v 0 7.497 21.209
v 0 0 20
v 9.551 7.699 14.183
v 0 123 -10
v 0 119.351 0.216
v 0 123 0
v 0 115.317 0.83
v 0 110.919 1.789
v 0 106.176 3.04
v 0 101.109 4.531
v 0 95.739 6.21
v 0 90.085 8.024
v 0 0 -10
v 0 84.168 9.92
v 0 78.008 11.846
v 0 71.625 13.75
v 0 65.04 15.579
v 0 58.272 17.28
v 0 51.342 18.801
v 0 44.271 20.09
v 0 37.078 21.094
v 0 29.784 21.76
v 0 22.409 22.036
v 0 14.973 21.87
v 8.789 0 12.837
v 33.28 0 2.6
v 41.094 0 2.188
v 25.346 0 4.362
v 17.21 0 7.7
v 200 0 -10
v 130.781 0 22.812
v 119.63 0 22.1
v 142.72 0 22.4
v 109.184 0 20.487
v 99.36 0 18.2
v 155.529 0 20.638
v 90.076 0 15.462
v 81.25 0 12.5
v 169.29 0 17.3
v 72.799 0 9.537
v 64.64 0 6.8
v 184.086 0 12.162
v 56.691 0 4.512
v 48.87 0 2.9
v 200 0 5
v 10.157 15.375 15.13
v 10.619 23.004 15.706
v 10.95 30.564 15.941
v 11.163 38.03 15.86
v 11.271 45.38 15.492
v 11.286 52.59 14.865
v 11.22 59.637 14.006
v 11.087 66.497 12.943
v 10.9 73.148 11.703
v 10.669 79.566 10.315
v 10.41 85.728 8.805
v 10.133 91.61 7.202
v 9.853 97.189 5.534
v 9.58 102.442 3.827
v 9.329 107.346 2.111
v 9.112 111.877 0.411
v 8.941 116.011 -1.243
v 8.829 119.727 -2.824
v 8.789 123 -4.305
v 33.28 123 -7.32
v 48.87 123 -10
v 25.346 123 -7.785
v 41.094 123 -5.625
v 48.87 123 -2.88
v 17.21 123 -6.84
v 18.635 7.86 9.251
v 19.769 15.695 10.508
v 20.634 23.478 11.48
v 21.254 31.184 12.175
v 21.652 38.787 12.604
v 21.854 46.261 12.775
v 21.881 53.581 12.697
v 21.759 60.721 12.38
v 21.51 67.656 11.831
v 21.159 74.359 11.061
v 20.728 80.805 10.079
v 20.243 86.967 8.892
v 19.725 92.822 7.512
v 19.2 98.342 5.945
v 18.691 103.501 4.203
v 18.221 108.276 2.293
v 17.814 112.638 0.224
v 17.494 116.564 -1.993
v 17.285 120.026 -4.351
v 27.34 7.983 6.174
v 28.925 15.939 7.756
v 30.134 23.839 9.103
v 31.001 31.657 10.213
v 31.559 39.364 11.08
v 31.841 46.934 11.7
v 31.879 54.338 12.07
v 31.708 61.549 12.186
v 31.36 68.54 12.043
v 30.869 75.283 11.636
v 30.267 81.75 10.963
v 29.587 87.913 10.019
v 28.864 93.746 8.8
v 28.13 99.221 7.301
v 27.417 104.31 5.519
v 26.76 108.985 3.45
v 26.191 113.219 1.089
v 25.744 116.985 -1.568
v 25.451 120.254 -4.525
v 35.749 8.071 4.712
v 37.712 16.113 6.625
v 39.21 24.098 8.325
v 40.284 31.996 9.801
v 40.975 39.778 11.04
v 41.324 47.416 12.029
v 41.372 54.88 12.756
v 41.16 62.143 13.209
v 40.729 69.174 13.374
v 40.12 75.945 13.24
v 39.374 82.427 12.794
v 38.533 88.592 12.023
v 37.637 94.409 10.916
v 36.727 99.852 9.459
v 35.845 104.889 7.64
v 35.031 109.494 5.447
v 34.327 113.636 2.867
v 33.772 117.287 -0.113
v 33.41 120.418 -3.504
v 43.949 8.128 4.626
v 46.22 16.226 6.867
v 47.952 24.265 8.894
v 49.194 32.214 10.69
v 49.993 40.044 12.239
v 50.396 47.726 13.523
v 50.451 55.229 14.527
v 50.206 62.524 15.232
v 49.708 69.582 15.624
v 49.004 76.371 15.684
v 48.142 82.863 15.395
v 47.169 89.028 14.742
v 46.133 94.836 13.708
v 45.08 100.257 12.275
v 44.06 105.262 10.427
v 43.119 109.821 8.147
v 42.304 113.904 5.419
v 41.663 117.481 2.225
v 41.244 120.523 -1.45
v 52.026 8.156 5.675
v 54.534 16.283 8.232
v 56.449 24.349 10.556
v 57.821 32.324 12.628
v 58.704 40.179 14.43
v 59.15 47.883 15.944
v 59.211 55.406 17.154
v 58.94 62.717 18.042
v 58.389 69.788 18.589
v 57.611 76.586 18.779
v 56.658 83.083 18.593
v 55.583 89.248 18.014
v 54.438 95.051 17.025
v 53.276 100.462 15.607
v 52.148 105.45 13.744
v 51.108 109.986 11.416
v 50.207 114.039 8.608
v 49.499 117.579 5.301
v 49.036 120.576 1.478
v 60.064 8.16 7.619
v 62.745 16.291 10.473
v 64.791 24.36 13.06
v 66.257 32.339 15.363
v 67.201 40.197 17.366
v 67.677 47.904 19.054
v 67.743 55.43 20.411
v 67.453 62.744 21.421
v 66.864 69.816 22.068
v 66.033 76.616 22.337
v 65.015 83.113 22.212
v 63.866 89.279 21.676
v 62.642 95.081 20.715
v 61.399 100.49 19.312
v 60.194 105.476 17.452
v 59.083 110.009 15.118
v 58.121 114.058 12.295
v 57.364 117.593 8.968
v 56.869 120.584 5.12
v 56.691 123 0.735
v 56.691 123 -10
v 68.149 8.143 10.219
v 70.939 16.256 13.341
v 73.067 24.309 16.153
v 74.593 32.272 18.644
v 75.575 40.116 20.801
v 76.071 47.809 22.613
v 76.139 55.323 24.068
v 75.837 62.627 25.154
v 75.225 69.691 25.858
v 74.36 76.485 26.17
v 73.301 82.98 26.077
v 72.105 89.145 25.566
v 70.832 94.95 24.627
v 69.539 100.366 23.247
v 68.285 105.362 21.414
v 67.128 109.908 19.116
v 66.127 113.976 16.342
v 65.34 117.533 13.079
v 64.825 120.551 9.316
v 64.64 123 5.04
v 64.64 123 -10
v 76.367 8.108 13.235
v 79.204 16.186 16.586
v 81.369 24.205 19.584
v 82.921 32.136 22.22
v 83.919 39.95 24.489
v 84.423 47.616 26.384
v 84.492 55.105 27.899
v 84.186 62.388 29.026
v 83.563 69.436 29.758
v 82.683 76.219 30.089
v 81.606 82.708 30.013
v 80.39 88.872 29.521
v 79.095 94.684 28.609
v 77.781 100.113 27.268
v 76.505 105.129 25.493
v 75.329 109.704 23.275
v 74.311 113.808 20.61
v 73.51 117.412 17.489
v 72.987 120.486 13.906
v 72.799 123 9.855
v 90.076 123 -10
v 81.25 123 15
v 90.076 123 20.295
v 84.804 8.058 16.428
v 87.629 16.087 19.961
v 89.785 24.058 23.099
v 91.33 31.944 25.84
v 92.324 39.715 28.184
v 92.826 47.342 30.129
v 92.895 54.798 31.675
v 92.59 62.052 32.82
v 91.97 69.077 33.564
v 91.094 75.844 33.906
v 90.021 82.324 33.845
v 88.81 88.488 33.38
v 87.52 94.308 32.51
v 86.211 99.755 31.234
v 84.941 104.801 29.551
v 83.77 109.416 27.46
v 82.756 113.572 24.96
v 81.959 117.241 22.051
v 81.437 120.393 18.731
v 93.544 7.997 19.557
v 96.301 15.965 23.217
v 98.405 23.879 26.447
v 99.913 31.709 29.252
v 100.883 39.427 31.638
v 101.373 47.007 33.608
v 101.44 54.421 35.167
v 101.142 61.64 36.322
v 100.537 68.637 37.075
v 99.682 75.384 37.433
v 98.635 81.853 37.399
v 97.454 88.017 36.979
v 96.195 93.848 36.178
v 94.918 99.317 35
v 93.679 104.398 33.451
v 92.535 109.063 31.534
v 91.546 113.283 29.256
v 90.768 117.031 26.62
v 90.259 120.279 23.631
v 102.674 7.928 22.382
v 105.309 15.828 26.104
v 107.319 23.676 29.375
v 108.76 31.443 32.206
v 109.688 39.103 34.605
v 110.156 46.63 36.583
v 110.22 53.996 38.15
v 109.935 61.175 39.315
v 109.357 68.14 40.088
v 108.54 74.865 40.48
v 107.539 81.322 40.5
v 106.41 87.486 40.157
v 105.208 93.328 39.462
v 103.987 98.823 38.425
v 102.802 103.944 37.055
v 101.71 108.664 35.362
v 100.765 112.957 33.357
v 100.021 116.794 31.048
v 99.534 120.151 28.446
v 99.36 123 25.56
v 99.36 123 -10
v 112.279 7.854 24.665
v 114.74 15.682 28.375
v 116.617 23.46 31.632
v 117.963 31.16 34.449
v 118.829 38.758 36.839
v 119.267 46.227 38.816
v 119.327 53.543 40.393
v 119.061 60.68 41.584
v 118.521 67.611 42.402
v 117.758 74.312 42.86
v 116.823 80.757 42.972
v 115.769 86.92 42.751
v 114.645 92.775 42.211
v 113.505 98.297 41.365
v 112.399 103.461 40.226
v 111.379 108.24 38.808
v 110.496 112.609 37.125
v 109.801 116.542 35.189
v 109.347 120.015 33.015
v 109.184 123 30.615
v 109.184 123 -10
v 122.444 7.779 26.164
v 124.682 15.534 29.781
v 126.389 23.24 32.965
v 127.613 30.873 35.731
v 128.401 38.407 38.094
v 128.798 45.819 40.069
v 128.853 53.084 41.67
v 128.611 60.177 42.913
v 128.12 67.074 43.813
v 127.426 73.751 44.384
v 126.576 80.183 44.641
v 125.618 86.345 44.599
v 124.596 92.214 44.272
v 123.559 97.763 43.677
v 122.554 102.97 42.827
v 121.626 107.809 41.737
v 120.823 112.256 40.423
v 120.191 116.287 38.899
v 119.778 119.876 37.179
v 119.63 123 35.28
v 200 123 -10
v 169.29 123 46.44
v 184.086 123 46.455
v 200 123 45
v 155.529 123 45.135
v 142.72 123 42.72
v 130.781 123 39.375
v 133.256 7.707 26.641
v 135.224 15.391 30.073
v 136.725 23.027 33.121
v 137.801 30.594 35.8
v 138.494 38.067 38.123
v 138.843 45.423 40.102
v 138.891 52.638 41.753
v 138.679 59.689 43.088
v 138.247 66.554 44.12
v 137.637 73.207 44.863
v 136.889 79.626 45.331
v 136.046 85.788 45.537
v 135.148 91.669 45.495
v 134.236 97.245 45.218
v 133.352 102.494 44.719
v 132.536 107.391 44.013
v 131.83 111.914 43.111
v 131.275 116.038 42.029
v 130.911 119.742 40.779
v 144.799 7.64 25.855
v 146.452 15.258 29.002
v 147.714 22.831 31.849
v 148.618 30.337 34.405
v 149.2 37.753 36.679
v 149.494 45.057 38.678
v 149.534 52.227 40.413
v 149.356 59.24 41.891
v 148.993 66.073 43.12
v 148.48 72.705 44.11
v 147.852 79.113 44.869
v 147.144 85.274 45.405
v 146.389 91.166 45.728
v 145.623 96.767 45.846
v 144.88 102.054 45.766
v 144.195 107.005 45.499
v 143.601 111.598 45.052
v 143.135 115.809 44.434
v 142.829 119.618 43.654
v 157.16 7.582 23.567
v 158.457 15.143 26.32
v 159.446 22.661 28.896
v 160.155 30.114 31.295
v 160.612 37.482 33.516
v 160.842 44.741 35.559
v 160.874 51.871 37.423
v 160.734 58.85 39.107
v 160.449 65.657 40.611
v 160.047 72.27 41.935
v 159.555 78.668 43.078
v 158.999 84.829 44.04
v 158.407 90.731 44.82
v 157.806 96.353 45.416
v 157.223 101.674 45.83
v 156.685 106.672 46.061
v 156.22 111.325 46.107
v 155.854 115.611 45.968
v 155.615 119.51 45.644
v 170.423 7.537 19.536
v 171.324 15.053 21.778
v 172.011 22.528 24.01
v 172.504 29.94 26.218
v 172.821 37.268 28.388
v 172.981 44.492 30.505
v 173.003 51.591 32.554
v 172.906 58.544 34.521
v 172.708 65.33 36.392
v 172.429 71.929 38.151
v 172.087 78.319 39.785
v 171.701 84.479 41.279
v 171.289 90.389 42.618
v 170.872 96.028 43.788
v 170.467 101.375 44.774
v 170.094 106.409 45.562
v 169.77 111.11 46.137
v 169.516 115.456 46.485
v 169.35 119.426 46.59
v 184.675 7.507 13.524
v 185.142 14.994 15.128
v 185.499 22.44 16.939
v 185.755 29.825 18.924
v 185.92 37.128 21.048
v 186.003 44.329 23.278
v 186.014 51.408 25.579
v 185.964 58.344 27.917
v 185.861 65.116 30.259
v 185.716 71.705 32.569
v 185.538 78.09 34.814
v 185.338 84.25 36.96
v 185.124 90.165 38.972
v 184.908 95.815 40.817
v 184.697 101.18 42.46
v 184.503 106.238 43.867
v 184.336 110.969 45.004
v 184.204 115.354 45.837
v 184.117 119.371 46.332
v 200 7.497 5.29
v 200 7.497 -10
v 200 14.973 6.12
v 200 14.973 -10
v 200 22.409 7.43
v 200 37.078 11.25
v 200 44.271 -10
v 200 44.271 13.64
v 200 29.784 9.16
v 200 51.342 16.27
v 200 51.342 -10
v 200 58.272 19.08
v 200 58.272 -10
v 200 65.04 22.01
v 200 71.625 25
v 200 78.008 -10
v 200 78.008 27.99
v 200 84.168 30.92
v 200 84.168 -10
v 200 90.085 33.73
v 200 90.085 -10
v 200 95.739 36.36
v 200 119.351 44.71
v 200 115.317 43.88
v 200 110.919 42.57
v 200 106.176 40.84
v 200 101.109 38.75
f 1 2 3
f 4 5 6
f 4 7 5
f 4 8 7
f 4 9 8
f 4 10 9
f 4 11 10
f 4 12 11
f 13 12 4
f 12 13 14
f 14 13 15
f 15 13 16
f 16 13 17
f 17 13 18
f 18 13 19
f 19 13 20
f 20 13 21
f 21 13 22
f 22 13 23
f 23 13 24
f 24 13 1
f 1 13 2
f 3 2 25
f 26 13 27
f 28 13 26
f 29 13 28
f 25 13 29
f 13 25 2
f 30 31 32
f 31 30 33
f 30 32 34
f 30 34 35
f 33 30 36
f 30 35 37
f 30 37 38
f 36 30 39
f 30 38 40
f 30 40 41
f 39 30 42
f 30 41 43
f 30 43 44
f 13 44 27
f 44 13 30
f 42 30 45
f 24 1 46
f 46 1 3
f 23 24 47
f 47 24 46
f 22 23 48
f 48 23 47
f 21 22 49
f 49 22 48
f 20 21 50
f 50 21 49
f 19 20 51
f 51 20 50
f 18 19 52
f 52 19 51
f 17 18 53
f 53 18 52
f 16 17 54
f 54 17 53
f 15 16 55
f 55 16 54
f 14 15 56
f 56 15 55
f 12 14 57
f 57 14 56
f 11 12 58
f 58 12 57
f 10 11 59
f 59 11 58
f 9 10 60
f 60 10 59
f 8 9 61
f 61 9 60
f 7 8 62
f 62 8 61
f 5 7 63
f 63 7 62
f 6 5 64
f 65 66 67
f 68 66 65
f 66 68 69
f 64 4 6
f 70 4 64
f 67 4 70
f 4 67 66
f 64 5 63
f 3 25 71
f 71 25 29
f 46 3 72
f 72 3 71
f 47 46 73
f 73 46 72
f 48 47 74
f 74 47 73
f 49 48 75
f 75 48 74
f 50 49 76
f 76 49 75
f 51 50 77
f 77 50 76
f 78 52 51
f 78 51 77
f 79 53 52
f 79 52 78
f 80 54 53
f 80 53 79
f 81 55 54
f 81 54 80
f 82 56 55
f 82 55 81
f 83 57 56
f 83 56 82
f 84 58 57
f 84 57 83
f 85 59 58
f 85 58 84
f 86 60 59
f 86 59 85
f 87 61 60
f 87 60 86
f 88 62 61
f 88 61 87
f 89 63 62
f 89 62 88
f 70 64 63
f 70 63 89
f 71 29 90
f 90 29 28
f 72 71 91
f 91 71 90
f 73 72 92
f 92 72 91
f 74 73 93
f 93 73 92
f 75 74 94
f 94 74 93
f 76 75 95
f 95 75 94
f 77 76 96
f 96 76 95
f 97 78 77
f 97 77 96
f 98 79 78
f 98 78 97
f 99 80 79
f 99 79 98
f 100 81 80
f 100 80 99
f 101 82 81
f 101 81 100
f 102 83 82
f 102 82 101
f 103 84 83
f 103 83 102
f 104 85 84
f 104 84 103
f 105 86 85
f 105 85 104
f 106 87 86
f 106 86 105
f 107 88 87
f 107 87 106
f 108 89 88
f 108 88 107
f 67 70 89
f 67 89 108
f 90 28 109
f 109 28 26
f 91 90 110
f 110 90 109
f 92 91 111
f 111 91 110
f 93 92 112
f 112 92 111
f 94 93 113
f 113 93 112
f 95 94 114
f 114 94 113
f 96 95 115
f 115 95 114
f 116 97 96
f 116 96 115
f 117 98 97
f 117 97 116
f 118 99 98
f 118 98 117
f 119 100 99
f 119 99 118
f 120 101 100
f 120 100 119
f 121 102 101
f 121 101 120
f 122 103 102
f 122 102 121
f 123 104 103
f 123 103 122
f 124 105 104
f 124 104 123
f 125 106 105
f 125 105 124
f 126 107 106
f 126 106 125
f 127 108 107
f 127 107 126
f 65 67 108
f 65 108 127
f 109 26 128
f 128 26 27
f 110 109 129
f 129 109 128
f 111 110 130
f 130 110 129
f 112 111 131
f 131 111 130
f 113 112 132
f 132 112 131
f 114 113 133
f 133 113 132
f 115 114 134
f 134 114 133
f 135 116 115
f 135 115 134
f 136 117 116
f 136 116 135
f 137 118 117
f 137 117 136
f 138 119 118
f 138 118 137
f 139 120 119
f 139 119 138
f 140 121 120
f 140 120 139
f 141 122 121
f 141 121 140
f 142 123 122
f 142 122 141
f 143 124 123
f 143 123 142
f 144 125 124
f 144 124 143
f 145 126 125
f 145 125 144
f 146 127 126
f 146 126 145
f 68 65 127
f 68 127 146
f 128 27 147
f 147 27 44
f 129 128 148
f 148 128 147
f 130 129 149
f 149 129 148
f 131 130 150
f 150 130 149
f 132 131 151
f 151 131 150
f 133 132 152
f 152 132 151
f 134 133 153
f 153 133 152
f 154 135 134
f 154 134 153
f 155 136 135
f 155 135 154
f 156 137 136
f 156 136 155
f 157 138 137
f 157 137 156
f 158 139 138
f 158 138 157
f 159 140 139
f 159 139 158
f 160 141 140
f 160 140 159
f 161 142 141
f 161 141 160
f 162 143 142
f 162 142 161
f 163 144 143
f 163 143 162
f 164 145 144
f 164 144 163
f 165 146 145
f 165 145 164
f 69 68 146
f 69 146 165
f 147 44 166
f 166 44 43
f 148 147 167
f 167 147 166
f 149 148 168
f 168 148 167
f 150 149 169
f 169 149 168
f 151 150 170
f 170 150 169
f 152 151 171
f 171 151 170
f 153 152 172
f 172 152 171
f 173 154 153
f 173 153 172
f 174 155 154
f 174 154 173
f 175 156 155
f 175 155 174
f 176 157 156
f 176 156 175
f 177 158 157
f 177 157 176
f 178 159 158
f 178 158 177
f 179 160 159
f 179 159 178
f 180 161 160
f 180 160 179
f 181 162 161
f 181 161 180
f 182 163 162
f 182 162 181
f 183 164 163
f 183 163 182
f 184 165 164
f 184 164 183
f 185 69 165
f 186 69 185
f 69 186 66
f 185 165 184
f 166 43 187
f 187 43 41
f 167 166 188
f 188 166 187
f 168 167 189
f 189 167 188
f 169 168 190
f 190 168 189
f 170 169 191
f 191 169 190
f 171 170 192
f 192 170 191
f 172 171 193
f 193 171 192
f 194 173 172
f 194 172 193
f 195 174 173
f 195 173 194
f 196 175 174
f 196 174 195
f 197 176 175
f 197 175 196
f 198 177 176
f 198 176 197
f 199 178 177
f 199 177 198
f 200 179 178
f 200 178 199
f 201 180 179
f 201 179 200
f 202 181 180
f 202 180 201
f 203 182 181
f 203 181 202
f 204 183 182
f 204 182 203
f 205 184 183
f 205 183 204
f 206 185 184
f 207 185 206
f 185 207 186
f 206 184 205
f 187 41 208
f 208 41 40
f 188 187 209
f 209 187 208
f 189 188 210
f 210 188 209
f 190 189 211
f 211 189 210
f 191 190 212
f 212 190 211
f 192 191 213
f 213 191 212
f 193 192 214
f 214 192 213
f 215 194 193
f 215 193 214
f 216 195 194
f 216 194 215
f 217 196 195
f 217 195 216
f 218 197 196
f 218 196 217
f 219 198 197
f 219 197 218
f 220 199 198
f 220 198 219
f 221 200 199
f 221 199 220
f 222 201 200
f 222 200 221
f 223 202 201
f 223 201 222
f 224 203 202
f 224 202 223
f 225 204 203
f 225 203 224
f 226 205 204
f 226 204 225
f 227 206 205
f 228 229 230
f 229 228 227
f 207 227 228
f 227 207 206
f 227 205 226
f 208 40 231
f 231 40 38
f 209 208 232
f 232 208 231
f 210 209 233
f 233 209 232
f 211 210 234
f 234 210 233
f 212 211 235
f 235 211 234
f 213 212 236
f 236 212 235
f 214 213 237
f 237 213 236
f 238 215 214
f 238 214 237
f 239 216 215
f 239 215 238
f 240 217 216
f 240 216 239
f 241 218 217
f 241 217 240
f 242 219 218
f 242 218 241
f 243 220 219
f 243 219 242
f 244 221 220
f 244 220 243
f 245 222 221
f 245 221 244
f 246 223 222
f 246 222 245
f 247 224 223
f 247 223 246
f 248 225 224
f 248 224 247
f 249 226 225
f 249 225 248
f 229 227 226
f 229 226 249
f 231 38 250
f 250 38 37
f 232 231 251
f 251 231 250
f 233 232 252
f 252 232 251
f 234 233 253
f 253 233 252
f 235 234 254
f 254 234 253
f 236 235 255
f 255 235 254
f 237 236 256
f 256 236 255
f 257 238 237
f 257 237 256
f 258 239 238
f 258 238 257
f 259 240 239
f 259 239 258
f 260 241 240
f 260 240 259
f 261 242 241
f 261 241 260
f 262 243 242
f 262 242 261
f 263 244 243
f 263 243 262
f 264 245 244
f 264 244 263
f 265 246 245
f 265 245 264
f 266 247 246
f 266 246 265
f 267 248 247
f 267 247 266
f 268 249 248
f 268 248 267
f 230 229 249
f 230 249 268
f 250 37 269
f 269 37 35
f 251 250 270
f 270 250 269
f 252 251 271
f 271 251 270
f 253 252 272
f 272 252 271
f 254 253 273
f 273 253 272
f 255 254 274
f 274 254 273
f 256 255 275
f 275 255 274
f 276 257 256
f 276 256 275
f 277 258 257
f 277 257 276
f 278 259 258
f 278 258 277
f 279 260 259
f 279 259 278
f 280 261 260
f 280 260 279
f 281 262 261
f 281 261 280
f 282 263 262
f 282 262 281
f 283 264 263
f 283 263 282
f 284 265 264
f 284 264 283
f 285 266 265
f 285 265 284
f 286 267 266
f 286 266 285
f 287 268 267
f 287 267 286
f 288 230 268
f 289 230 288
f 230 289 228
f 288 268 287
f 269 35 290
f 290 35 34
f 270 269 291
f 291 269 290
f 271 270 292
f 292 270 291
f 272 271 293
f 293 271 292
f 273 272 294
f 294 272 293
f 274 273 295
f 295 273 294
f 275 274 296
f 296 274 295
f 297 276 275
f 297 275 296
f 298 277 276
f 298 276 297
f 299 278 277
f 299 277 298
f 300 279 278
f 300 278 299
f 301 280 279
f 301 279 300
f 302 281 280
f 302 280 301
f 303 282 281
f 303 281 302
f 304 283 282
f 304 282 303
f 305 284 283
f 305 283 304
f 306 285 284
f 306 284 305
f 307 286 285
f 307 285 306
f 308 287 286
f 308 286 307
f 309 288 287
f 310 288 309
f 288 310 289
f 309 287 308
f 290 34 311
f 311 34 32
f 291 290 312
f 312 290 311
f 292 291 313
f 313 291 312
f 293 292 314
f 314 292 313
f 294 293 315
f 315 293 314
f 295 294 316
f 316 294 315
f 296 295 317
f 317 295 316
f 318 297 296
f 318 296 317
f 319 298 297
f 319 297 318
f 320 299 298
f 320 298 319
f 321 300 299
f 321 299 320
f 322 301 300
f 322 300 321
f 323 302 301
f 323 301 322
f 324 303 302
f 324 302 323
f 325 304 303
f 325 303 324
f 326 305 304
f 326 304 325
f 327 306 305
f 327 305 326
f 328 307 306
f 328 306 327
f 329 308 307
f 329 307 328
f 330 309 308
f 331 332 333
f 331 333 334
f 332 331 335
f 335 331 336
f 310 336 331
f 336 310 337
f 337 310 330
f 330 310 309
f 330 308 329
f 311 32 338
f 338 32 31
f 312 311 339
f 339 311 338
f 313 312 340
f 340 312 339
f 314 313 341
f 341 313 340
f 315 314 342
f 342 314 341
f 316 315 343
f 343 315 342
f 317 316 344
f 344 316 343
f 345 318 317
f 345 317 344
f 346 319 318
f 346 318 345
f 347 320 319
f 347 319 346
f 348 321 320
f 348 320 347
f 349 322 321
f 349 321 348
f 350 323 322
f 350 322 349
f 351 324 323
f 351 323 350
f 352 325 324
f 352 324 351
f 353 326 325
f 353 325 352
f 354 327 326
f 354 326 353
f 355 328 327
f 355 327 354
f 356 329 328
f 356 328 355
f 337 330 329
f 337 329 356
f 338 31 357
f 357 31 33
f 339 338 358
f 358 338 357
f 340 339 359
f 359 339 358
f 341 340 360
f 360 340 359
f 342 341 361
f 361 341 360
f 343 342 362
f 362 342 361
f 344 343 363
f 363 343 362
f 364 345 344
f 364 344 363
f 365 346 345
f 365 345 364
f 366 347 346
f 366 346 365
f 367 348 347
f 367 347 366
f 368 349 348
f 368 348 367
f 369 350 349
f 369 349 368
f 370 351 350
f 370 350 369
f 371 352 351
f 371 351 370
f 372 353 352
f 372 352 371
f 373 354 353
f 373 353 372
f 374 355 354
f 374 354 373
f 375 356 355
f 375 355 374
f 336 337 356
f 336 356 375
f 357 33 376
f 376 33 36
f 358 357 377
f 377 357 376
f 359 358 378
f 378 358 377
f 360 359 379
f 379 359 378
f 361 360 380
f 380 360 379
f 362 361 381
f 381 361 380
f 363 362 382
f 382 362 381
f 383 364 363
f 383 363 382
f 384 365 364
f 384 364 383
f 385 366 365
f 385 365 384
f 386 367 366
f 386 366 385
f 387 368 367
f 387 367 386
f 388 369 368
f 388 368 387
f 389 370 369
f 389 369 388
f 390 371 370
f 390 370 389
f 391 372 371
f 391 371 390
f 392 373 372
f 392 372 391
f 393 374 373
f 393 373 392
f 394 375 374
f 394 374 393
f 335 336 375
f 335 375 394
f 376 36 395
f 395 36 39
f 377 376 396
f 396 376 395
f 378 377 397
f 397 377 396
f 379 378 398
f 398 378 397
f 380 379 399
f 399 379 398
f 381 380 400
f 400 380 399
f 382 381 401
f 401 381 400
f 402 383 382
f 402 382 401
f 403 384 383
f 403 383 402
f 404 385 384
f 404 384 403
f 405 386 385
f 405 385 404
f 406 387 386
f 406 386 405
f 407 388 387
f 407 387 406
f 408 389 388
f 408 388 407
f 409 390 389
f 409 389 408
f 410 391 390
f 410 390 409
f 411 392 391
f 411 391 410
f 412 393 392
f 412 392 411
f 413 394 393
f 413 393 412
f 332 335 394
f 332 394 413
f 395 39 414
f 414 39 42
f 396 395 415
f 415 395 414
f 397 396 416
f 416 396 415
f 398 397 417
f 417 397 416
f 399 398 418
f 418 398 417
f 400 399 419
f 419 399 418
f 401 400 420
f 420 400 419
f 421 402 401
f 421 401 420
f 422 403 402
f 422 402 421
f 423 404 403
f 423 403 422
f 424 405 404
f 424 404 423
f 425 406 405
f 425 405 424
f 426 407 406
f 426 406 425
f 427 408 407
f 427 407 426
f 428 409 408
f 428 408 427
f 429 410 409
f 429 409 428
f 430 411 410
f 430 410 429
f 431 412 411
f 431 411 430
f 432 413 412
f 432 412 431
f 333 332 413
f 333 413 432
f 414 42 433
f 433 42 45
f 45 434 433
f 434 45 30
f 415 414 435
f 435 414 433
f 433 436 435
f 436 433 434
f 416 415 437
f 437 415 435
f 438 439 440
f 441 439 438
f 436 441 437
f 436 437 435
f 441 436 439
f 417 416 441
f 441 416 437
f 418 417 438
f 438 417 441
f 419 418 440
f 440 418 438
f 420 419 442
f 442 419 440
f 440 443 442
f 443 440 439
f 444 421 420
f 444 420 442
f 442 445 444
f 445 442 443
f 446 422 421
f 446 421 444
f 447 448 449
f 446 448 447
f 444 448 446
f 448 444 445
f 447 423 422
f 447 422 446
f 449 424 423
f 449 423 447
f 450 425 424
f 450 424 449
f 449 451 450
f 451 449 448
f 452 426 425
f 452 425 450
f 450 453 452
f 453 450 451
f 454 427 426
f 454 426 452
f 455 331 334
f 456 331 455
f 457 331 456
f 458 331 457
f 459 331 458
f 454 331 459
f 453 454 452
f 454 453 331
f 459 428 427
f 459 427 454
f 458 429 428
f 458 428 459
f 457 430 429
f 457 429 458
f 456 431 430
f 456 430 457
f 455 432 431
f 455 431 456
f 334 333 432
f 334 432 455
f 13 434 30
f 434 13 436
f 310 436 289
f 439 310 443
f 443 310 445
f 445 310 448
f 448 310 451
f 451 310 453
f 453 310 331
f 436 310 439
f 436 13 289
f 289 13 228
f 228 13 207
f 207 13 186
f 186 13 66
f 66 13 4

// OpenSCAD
// smaller values are better
taiwan_fineness = 5;  

// smaller values are better
wave_fineness = 0.05;  

model_type = "Both";  // [Both, Taiwan, Wave]

// Common-based private API

function __frags(radius) = $fn > 0 ? 
            ($fn >= 3 ? $fn : 3) : 
            max(min(360 / $fa, radius * 6.28318 / $fs), 5);

function __to2d(p) = [p[0], p[1]];

function __to3d(p) = [p[0], p[1], 0];

function __is_vector(value) = !(value >= "") && len(value) != undef;

/**
* shape_taiwan.scad
*
* Returns shape points of Taiwan.
* They can be used with xxx_extrude modules of dotSCAD.
* The shape points can be also used with the built-in polygon module. 
* 
* @copyright Justin Lin, 2017
* @license https://opensource.org/licenses/lgpl-3.0.html
*
* @see https://openhome.cc/eGossip/OpenSCAD/lib-shape_taiwan.html
*
**/

function shape_taiwan(h) = [[3.857235,6.240775],[3.790195,6.257785],[3.735955,6.262885],[3.628068,6.245875],[3.595808,6.260195],[3.554288,6.323865],[3.516978,6.457102],[3.507678,6.536102],[3.511878,6.582842],[3.539168,6.637082],[3.489808,6.669342],[2.782860,6.839047],[2.721800,6.861117],[2.697210,6.888317],[2.684410,6.902717],[2.628400,6.942717],[2.610630,6.962087],[2.610630,6.996957],[2.625870,7.021547],[2.642880,7.043527],[2.642880,7.055487],[2.610620,7.065677],[2.563960,7.060577],[2.522270,7.048787],[2.502810,7.041087],[2.448490,7.156471],[2.293188,7.371234],[2.224378,7.425554],[2.056442,7.442484],[1.886737,7.405094],[1.739014,7.328794],[1.637949,7.238004],[1.588680,7.149744],[1.556592,7.070744],[1.544632,7.055504],[1.514903,7.041104],[1.485258,7.018954],[1.536576,6.972504],[1.588252,6.929094],[1.630956,6.862814],[1.665236,6.770334],[1.630956,6.862814],[1.613483,6.803874],[1.577574,6.837214],[1.539493,6.891164],[1.485255,6.873934],[1.438512,6.873934],[1.403813,6.866234],[1.374084,6.851744],[1.280683,6.772824],[1.206821,6.745704],[0.723984,6.656594],[0.586451,6.607414],[0.515200,6.570944],[0.458435,6.521674],[0.393838,6.479224],[0.108666,6.388434],[-0.002506,6.292504],[-0.110307,6.166930],[-0.278327,5.897845],[-0.312266,5.804525],[-0.322462,5.760475],[-0.319942,5.740765],[-0.359780,5.728045],[-0.398773,5.694105],[-0.431113,5.649215],[-0.443073,5.605085],[-0.453170,5.545625],[-0.477762,5.514295],[-0.504966,5.481955],[-0.527025,5.437905],[-0.511698,5.403035],[-0.499737,5.375915],[-0.499737,5.348715],[-0.511683,5.324125],[-0.544022,5.280075],[-0.630518,5.105233],[-0.652506,5.021183],[-0.709523,4.994063],[-0.721317,4.965173],[-0.751047,4.878513],[-0.807895,4.819223],[-0.849502,4.763133],[-0.835106,4.679163],[-0.945350,4.701233],[-1.031930,4.676643],[-1.103181,4.624763],[-1.166852,4.558563],[-1.187240,4.521253],[-1.206789,4.479813],[-1.236433,4.447553],[-1.339268,4.417823],[-1.364617,4.376213],[-1.388443,4.280373],[-1.477465,4.119932],[-1.514775,4.034192],[-1.526736,3.933212],[-1.556382,3.871222],[-1.873894,3.521621],[-1.923078,3.437571],[-1.967211,3.284795],[-2.110553,3.038618],[-2.152244,2.849458],[-2.187028,2.750918],[-2.238738,2.708638],[-2.248098,2.656758],[-2.433130,2.442837],[-2.474820,2.403927],[-2.489980,2.361477],[-2.496810,2.206174],[-2.517270,2.159514],[-2.595258,2.098284],[-2.613115,2.055834],[-2.622375,2.009260],[-2.647053,1.987280],[-2.681835,1.972793],[-2.719147,1.945587],[-2.765889,1.901371],[-2.807410,1.827678],[-2.895759,1.580743],[-2.960103,1.462665],[-3.001707,1.342230],[-3.033963,1.299783],[-3.142610,1.194507],[-3.162234,1.149449],[-3.186829,1.041731],[-3.211421,0.994987],[-3.297915,0.928032],[-3.309876,0.906048],[-3.325036,0.864443],[-3.421048,0.738702],[-3.437974,0.692212],[-3.474525,0.558807],[-3.544093,0.411083],[-3.625533,0.283068],[-3.694342,0.142925],[-3.724072,-0.047077],[-3.716342,-0.135425],[-3.674737,-0.317847],[-3.659482,-0.475761],[-3.623015,-0.539348],[-3.610290,-0.588533],[-3.625545,-0.628538],[-3.649371,-0.659782],[-3.657031,-0.687068],[-3.610289,-0.709975],[-3.610289,-0.738780],[-3.640019,-0.795629],[-3.575422,-0.918676],[-3.640019,-1.128469],[-3.654343,-1.140261],[-3.679021,-1.147841],[-3.679021,-1.147841],[-3.625532,-1.189442],[-3.595888,-1.204600],[-3.583163,-1.251343],[-3.605151,-1.243763],[-3.647598,-1.287811],[-3.684065,-1.344743],[-3.681625,-1.371861],[-3.721377,-1.382049],[-3.745972,-1.409251],[-3.797852,-1.544257],[-3.804582,-1.581567],[-3.817307,-1.611212],[-3.849563,-1.655259],[-3.876767,-1.709581],[-3.866501,-1.758935],[-3.847139,-1.808119],[-3.834343,-1.866652],[-3.853967,-1.906657],[-3.896328,-1.918449],[-3.935323,-1.940517],[-3.945517,-2.002504],[-3.903153,-2.051688],[-3.836870,-2.108458],[-3.836870,-2.108458],[-3.914521,-2.125253],[-3.924856,-2.167465],[-3.802098,-2.217177],[-3.780039,-2.241687],[-3.795366,-2.285987],[-3.841941,-2.302917],[-3.901401,-2.310517],[-3.945534,-2.332497],[-3.945534,-2.332497],[-3.909015,-2.389842],[-3.812282,-2.425988],[-3.748697,-2.453108],[-3.735901,-2.490418],[-3.610322,-2.512488],[-3.514395,-2.526978],[-3.497373,-2.605978],[-3.536452,-2.699208],[-3.610312,-2.751008],[-3.550853,-2.812998],[-3.521966,-2.867318],[-3.474548,-3.171944],[-3.462683,-3.201754],[-3.421078,-3.278054],[-3.410884,-3.312924],[-3.391356,-3.332374],[-3.371827,-3.347614],[-3.361728,-3.367234],[-3.366698,-3.403534],[-3.391374,-3.458024],[-3.391374,-3.504684],[-3.376047,-3.573324],[-3.304796,-3.728795],[-3.228491,-3.847546],[-3.186887,-3.933196],[-3.164732,-4.022386],[-3.181754,-4.086056],[-3.214010,-4.157226],[-3.189418,-4.228476],[-3.137705,-4.293156],[-2.997562,-4.423698],[-2.916122,-4.514578],[-2.856746,-4.625749],[-2.834591,-4.738605],[-2.834591,-4.738605],[-2.844781,-4.765724],[-2.642820,-4.921195],[-2.608122,-4.921195],[-2.580835,-4.911005],[-2.556243,-4.908305],[-2.512194,-4.928765],[-2.477327,-4.950745],[-2.403550,-5.014415],[-2.332216,-5.061155],[-2.176913,-5.134845],[-2.110630,-5.179905],[-2.100531,-5.199445],[-2.086040,-5.258065],[-2.068183,-5.268085],[-2.051256,-5.273285],[-2.001988,-5.302935],[-1.876413,-5.401475],[-1.844157,-5.445525],[-1.778044,-5.595775],[-1.693992,-5.701809],[-1.666872,-5.746109],[-1.359635,-6.536942],[-1.368995,-6.583512],[-1.406305,-6.638002],[-1.415565,-6.684662],[-1.415565,-6.849145],[-1.423225,-6.901025],[-1.423225,-6.930755],[-1.415565,-6.969915],[-1.329997,-7.110732],[-1.349454,-7.218450],[-1.346924,-7.253150],[-1.289990,-7.299890],[-1.239206,-7.315220],[-1.201810,-7.277830],[-1.196750,-7.176849],[-1.073620,-7.206579],[-0.953101,-7.260899],[-0.849593,-7.339819],[-0.778259,-7.442484],[-0.775729,-7.354134],[-0.795186,-7.214159],[-0.797786,-7.086059],[-0.736641,-7.029129],[-0.685014,-6.990139],[-0.645009,-6.898509],[-0.620417,-6.785653],[-0.637343,-5.770625],[-0.612751,-5.521921],[-0.590692,-5.435341],[-0.443136,-5.179899],[-0.371802,-4.923616],[-0.341989,-4.733445],[-0.290360,-4.642825],[-0.167230,-4.487353],[-0.128151,-4.411053],[-0.046711,-4.203955],[-0.014539,-4.162345],[0.027066,-4.142975],[0.191803,-3.960385],[0.441265,-3.795649],[0.515127,-3.726079],[0.588904,-3.632849],[0.620320,-3.581049],[0.640788,-3.531699],[0.643228,-3.487569],[0.633124,-3.391729],[0.640794,-3.351889],[0.689979,-3.293359],[0.903900,-3.113378],[0.923353,-3.070928],[1.083626,-2.845217],[1.116050,-2.753417],[1.162624,-2.554067],[1.233959,-2.423440],[1.261161,-2.335180],[1.278091,-2.300310],[1.310347,-2.266370],[1.384209,-2.212130],[1.416381,-2.179870],[1.490243,-2.027009],[1.504640,-1.879352],[1.502120,-1.724049],[1.526711,-1.549375],[1.558967,-1.455890],[1.598972,-1.379418],[1.706690,-1.236159],[1.741473,-1.160444],[1.982428,0.226167],[2.056374,0.376416],[2.181947,0.989965],[2.277877,1.253155],[2.329587,1.501858],[2.334687,1.601070],[2.347407,1.654466],[2.401727,1.743656],[2.421177,1.797978],[2.418777,1.847247],[2.406057,1.869143],[2.383907,1.883630],[2.361757,1.918497],[2.334727,1.999938],[2.332127,2.071360],[2.354197,2.137470],[2.467980,2.304731],[2.512030,2.492208],[2.556250,2.585528],[2.593560,2.622838],[2.699678,2.699228],[2.711468,2.721378],[2.699678,2.753638],[2.721748,2.784968],[2.792998,2.841898],[2.891448,2.975135],[2.980638,3.060784],[3.000088,3.098174],[3.000088,3.115185],[2.987368,3.137164],[2.972968,3.159234],[2.960248,3.174564],[2.945758,3.201684],[2.953458,3.221135],[2.967858,3.240755],[2.978048,3.267785],[2.984848,3.363795],[2.997568,3.412974],[3.017018,3.447754],[3.034118,3.489355],[3.027318,3.595473],[3.031518,3.644743],[3.140079,3.767706],[3.233479,3.824636],[3.273319,3.861105],[3.265719,3.903556],[3.238519,3.945166],[3.226729,3.989295],[3.233429,4.029045],[3.325149,4.080845],[3.339549,4.166585],[3.317479,4.267581],[3.278399,4.344051],[3.305599,4.363502],[3.347119,4.376222],[3.375256,4.386492],[3.411090,4.397932],[3.398688,4.425132],[3.325137,4.425408],[3.226687,4.487398],[3.172367,4.583238],[3.169767,4.706357],[3.191917,4.767497],[3.194317,4.829397],[3.142607,5.066241],[3.140007,5.179086],[3.147807,5.297090],[3.172397,5.415827],[3.206337,5.519432],[3.253837,5.593292],[3.541528,5.940365],[3.625578,6.014315],[3.945534,6.172153],[3.913274,6.211063],[3.857235,6.240775]] / 15 * h;

/**
* circle_path.scad
*
* Sometimes you need all points on the path of a circle. Here's 
* the function. Its $fa, $fs and $fn parameters are consistent 
* with the circle module.
* 
* @copyright Justin Lin, 2017
* @license https://opensource.org/licenses/lgpl-3.0.html
*
* @see https://openhome.cc/eGossip/OpenSCAD/lib-circle_path.html
*
**/

function circle_path(radius, n) =
    let(
        _frags = __frags(radius),
        step_a = 360 / _frags,
        end_a = 360 - step_a * ((n == undef || n > _frags) ? 1 : _frags - n + 1)
    )
    [
        for(a = [0 : step_a : end_a]) 
            [radius * cos(a), radius * sin(a)]
    ];

/**
* rotate_p.scad
*
* Rotates a point 'a' degrees around an arbitrary axis. 
* The rotation is applied in the following order: x, y, z. 
* 
* @copyright Justin Lin, 2017
* @license https://opensource.org/licenses/lgpl-3.0.html
*
* @see https://openhome.cc/eGossip/OpenSCAD/lib-rotate_p.html
*
**/ 

function _rotx(pt, a) = 
    let(cosa = cos(a), sina = sin(a))
    [
        pt[0], 
        pt[1] * cosa - pt[2] * sina,
        pt[1] * sina + pt[2] * cosa
    ];

function _roty(pt, a) = 
    let(cosa = cos(a), sina = sin(a))
    [
        pt[0] * cosa + pt[2] * sina, 
        pt[1],
        -pt[0] * sina + pt[2] * cosa, 
    ];

function _rotz(pt, a) = 
    let(cosa = cos(a), sina = sin(a))
    [
        pt[0] * cosa - pt[1] * sina,
        pt[0] * sina + pt[1] * cosa,
        pt[2]
    ];

function _rotate_p_3d(point, a) =
    _rotz(_roty(_rotx(point, a[0]), a[1]), a[2]);

function to_avect(a) =
     len(a) == 3 ? a : (
         len(a) == 2 ? [a[0], a[1], 0] : (
             len(a) == 1 ? [a[0], 0, 0] : [0, 0, a]
         ) 
     );

function rotate_p(point, a) =
    let(angle = to_avect(a))
    len(point) == 3 ? 
        _rotate_p_3d(point, angle) :
        __to2d(
            _rotate_p_3d(__to3d(point), angle)
        );

    
/**
* golden_spiral.scad
*
*  Gets all points and angles on the path of a golden spiral. The distance between two  points is almost constant. 
* 
*  It returns a vector of [[x, y], angle]. 
* 
* @copyright Justin Lin, 2017
* @license https://opensource.org/licenses/lgpl-3.0.html
*
* @see https://openhome.cc/eGossip/OpenSCAD/lib-golden_spiral.html
*
**/ 

function _fast_fibonacci_sub(nth) = 
    let(
        _f = _fast_fibonacci_2_elems(floor(nth / 2)),
        a = _f[0],
        b = _f[1],
        c = a * (b * 2 - a),
        d = a * a + b * b
    ) 
    nth % 2 == 0 ? [c, d] : [d, c + d];

function _fast_fibonacci_2_elems(nth) =
    nth == 0 ? [0, 1] : _fast_fibonacci_sub(nth);
    
function _fast_fibonacci(nth) =
    _fast_fibonacci_2_elems(nth)[0];
    
function _remove_same_pts(pts1, pts2) = 
    pts1[len(pts1) - 1] == pts2[0] ? 
        concat(pts1, [for(i = [1:len(pts2) - 1]) pts2[i]]) : 
        concat(pts1, pts2);    

function _golden_spiral_from_ls_or_eql_to(from, to, point_distance, rt_dir) = 
    let(
        f1 = _fast_fibonacci(from),
        f2 = _fast_fibonacci(from + 1),
        fn = floor(f1 * 6.28312 / point_distance), 
        $fn = fn + 4 - (fn % 4),
        circle_pts = circle_path(radius = f1, n = $fn / 4 + 1),
        len_pts = len(circle_pts),
        a_step = 360 / $fn * rt_dir,
        arc_points_angles = (rt_dir == 1 ? [
            for(i = [0:len_pts - 1])
                [circle_pts[i], a_step * i] 
        ] : [
            for(i = [0:len_pts - 1]) let(idx = len_pts - i - 1)
                [circle_pts[idx], a_step * i] 
        ]),
        offset = f2 - f1
    ) _remove_same_pts(
        arc_points_angles, 
        [
            for(pt_a = _golden_spiral(from + 1, to, point_distance, rt_dir)) 
                [ 
                    rotate_p(pt_a[0], [0, 0, 90 * rt_dir]) + 
                    (rt_dir == 1 ? [0, -offset, 0] : [-offset, 0, 0]), 
                    pt_a[1] + 90 * rt_dir
                ]
        ] 
    ); 

function _golden_spiral(from, to, point_distance, rt_dir) = 
    from <= to ? 
        _golden_spiral_from_ls_or_eql_to(from, to, point_distance, rt_dir) : [];

function golden_spiral(from, to, point_distance, rt_dir = "CT_CLK") =    
    _golden_spiral(from, to, point_distance, (rt_dir == "CT_CLK" ? 1 : -1));
    
/**
* cross_sections.scad
*
* Given a starting cross-section, points and angles along the path, this function
* will return all cross-sections.
*
* @copyright Justin Lin, 2017
* @license https://opensource.org/licenses/lgpl-3.0.html
*
* @see https://openhome.cc/eGossip/OpenSCAD/lib-cross_sections.html
*
**/

function cross_sections(shape_pts, path_pts, angles, twist = 0, scale = 1.0) =
    let(
        len_path_pts_minus_one = len(path_pts) - 1,
        sh_pts = len(shape_pts[0]) == 3 ? shape_pts : [for(p = shape_pts) __to3d(p)],
        pth_pts = len(path_pts[0]) == 3 ? path_pts : [for(p = path_pts) __to3d(p)],
        scale_step_vt = __is_vector(scale) ? 
            [(scale[0] - 1) / len_path_pts_minus_one, (scale[1] - 1) / len_path_pts_minus_one] :
            [(scale - 1) / len_path_pts_minus_one, (scale - 1) / len_path_pts_minus_one],
        scale_step_x = scale_step_vt[0],
        scale_step_y = scale_step_vt[1],
        twist_step = twist / len_path_pts_minus_one
    )
    [
        for(i = [0:len_path_pts_minus_one])
            [
                for(p = sh_pts) 
                let(scaled_p = [p[0] * (1 + scale_step_x * i), p[1] * (1 + scale_step_y * i), p[2]])
                    rotate_p(
                        rotate_p(scaled_p, twist_step * i)
                        , angles[i]
                    ) + pth_pts[i]
            ]
    ];

    
/**
* polysections.scad
*
* Crosscutting a tube-like shape at different points gets several cross-sections.
* This module can operate reversely. It uses cross-sections to construct a tube-like shape.
* 
* @copyright Justin Lin, 2017
* @license https://opensource.org/licenses/lgpl-3.0.html
*
* @see https://openhome.cc/eGossip/OpenSCAD/lib-polysections.html
*
**/

module polysections(sections, triangles = "SOLID") {
    function side_indexes(sects, begin_idx = 0) = 
        let(       
            leng_sects = len(sects),
            leng_pts_sect = len(sects[0])
        ) 
        [
            for(j = [begin_idx:leng_pts_sect:begin_idx + (leng_sects - 2) * leng_pts_sect])
                for(i = [0:leng_pts_sect - 1]) 
                    [
                        j + i, 
                        j + (i + 1) % leng_pts_sect, 
                        j + (i + 1) % leng_pts_sect + leng_pts_sect , 
                        j + i + leng_pts_sect
                    ]
        ];

    module solid_sections(sects) {
        leng_pts_sect = len(sects[0]);

        first_idxes = [for(i = [0:leng_pts_sect - 1]) i];   
        last_idxes = [
            for(i = [0:leng_pts_sect - 1]) 
                i + leng_pts_sect * (len(sects) - 1)
        ];    
        
        v_pts = [
            for(sect = sects) 
                for(pt = sect) 
                    pt
        ];
        
       polyhedron(
           v_pts, 
           concat([first_idxes], side_indexes(sects), [last_idxes])
       );    
    }

    module hollow_sections(sects) {
        leng_sects = len(sects);
        leng_sect = len(sects[0]);
        half_leng_sect = leng_sect / 2;
        half_leng_v_pts = leng_sects * half_leng_sect;

        function strip_sects(begin_idx, end_idx) = 
            [
                for(i = [0:leng_sects - 1]) 
                    [
                        for(j = [begin_idx:end_idx])
                            sects[i][j]
                    ]
            ]; 

        function end_idxes(begin_idx) = 
            [
                for(i =  [0:half_leng_sect - 1]) 
                    [
                        begin_idx + i, 
                        begin_idx + (i + 1) % half_leng_sect, 
                        begin_idx + (i + 1) % half_leng_sect + half_leng_v_pts, 
                        begin_idx + i + half_leng_v_pts
                    ]
            ];

        outer_sects = strip_sects(0, half_leng_sect - 1);
        inner_sects = strip_sects(half_leng_sect, leng_sect - 1);

        function to_v_pts(sects) = 
             [
                for(sect = sects) 
                    for(pt = sect) 
                        pt
             ];

        outer_v_pts =  to_v_pts(outer_sects);
        inner_v_pts = to_v_pts(inner_sects);

        outer_idxes = side_indexes(outer_sects);
        inner_idxes = side_indexes(inner_sects, half_leng_v_pts);
        first_idxes = end_idxes(0);
        last_idxes = end_idxes(half_leng_v_pts - half_leng_sect);

        polyhedron(
              concat(outer_v_pts, inner_v_pts),
              concat(first_idxes, outer_idxes, inner_idxes, last_idxes)
        ); 
    }
    
    module triangles_defined_sections() {
        module tri_sections(tri1, tri2) {
            polyhedron(
                points = concat(tri1, tri2),
                faces = [
                    [0, 1, 2], 
                    [3, 4, 5], 
                    [0, 1, 4], [1, 2, 5], [2, 0, 3], 
                    [0, 3, 4], [1, 4, 5], [2, 5, 3]
                ]
            );  
        }

        module two_sections(section1, section2) {
            for(idx = triangles) {
                // hull is for preventing from WARNING: Object may not be a valid 2-manifold
                hull() tri_sections(
                    [
                        section1[idx[0]], 
                        section1[idx[1]], 
                        section1[idx[2]]
                    ], 
                    [
                        section2[idx[0]], 
                        section2[idx[1]], 
                        section2[idx[2]]
                    ]
                );
            }
        }
        
        for(i = [0:len(sections) - 2]) {
             two_sections(
                 sections[i], 
                 sections[i + 1]
             );
        }
    }
    
    if(triangles == "SOLID") {
        solid_sections(sections);
    } else if(triangles == "HOLLOW") {
        hollow_sections(sections);
    }
    else {
        triangles_defined_sections();
    }
}

/**
* golden_spiral_extrude.scad
*
* Extrudes a 2D shape along the path of a golden spiral.
*
* @copyright Justin Lin, 2017
* @license https://opensource.org/licenses/lgpl-3.0.html
*
* @see https://openhome.cc/eGossip/OpenSCAD/lib-golden_spiral_extrude.html
*
**/

module golden_spiral_extrude(shape_pts, from, to, point_distance, 
                             rt_dir = "CT_CLK", twist = 0, scale = 1.0, triangles = "SOLID") {

    pts_angles = golden_spiral(
        from = from, 
        to = to, 
        point_distance = point_distance,
        rt_dir = rt_dir
    );

    pts = [for(pt_angle = pts_angles) pt_angle[0]];
    angles = [
        for(pt_angle = pts_angles) 
            [90, 0, pt_angle[1] + (rt_dir == "CT_CLK" ? 0 : 90)]
    ];

    polysections(
        cross_sections(
            shape_pts, 
            pts, angles, 
            twist = twist, 
            scale = scale
        ),
        triangles = triangles
    );
}

/**
* bezier_curve.scad
*
* Given a set of control points, the bezier_curve function returns points of the Bézier path. 
* Combined with the polyline, polyline3d or hull_polyline3d module defined in my lib-openscad, 
* you can create a Bézier curve.
* 
* @copyright Justin Lin, 2017
* @license https://opensource.org/licenses/lgpl-3.0.html
*
* @see https://openhome.cc/eGossip/OpenSCAD/lib-bezier_curve.html
*
**/ 

function _combi(n, k) =
    let(  
        bi_coef = [      
               [1],     // n = 0: for padding
              [1,1],    // n = 1: for Linear curves, how about drawing a line directly?
             [1,2,1],   // n = 2: for Quadratic curves
            [1,3,3,1]   // n = 3: for Cubic Bézier curves
        ]  
    )
    n < len(bi_coef) ? bi_coef[n][k] : (
        k == 0 ? 1 : (_combi(n, k - 1) * (n - k + 1) / k)
    );
        
function bezier_curve_coordinate(t, pn, n, i = 0) = 
    i == n + 1 ? 0 : 
        (_combi(n, i) * pn[i] * pow(1 - t, n - i) * pow(t, i) + 
            bezier_curve_coordinate(t, pn, n, i + 1));
        
function _bezier_curve_point(t, points) = 
    let(n = len(points) - 1) 
    [
        bezier_curve_coordinate(
            t, 
            [for(p = points) p[0]], 
            n
        ),
        bezier_curve_coordinate(
            t,  
            [for(p = points) p[1]], 
            n
        ),
        bezier_curve_coordinate(
            t, 
            [for(p = points) p[2]], 
            n
        )
    ];

function bezier_curve(t_step, points) = 
    concat([
        for(t = [0: t_step: 1]) 
            _bezier_curve_point(t, points)
    ], [_bezier_curve_point(1, points)]);
    
/**
* bezier_surface.scad
*
* Given a set of control points, the bezier_surface function returns points of the Bézier surface. 
* Combined with the function_grapher module defined in my lib-openscad, 
* you can create a Bézier surface.
*
* It depends on the bezier_curve function so remember to include bezier_curve.scad.
* 
* @copyright Justin Lin, 2017
* @license https://opensource.org/licenses/lgpl-3.0.html
*
* @see https://openhome.cc/eGossip/OpenSCAD/lib-bezier_surface.html
*
**/ 

function bezier_surface(t_step, ctrl_pts) =
    let(pts =  [
        for(i = [0:len(ctrl_pts) - 1]) 
            bezier_curve(t_step, ctrl_pts[i])
    ]) 
    [for(x = [0:len(pts[0]) - 1]) 
        bezier_curve(t_step,  
                [for(y = [0:len(pts) - 1]) pts[y][x]]
        ) 
    ];
    
/**
* function_grapher.scad
*
* 
* Given a set of points `[x, y, f(x, y)]` where `f(x, y)` is a 
* mathematics function, the `function_grapher` module can 
* create the graph of `f(x, y)`.
* It depends on the line3d and polyline3d modules so you have 
* to include "line3d.scad" and "polyline3d.scad".
* 
* @copyright Justin Lin, 2017
* @license https://opensource.org/licenses/lgpl-3.0.html
*
* @see https://openhome.cc/eGossip/OpenSCAD/lib-function_grapher.html
*
**/ 

module function_grapher(points, thickness, style = "FACES", slicing = "SLASH") {
    // Increasing $fn will be slow when you use "LINES" or "HULL_FACES".
     
    function tri_shell_points(top) =
        let(
            z_offset = [0, 0, -thickness],
            bottom = [
                top[0] + z_offset, 
                top[1] + z_offset, 
                top[2] + z_offset
            ],
            faces = [
                [0, 1, 2],
                [3, 4, 5],
                [0, 1, 4, 3],
                [1, 2, 5, 4],
                [2, 0, 3, 5]
            ]
        )
        [
            concat(top, bottom), 
            faces
        ];
        
        
    module tri_to_faces(top_tri1, top_tri2) {
        pts_faces1 = tri_shell_points(top_tri1);
        pts_faces2 = tri_shell_points(top_tri2);
        
        // hull is for preventing from WARNING: Object may not be a valid 2-manifold
        hull() polyhedron(
                points = pts_faces1[0], 
                faces = pts_faces1[1]
            );

        hull() polyhedron(
                points = pts_faces2[0],
                faces = pts_faces2[1]
            );
    }

    module tri_to_lines(tri1, tri2) {
       polyline3d(concat(tri1, [tri1[0]]), thickness);
       polyline3d(concat(tri2, [tri2[0]]), thickness);
    }
    
    module hull_pts(tri) {
       half_thickness = thickness / 2;
       hull() {
           translate(tri[0]) sphere(half_thickness);
           translate(tri[1]) sphere(half_thickness);
           translate(tri[2]) sphere(half_thickness);
       }    
    }
    
    module tri_to_hull_faces(tri1, tri2) {
       hull_pts(tri1);
       hull_pts(tri2);
    }    

    module tri_to_graph(tri1, tri2) {
        if(style == "FACES") {
            tri_to_faces(tri1, tri2);
        } else if(style == "LINES") {
            tri_to_lines(tri1, tri2);
        } else {  // Warning: May be very slow!!
            tri_to_hull_faces(tri1, tri2);
        }
    }

    for(yi = [0:len(points) - 2]) {
        for(xi = [0:len(points[yi]) - 2]) {
            if(slicing == "SLASH") {
                tri_to_graph([
                    points[yi][xi], 
                    points[yi][xi + 1], 
                    points[yi + 1][xi + 1]
                ], [
                    points[yi][xi], 
                    points[yi + 1][xi + 1], 
                    points[yi + 1][xi]
                ]);
            } else {                
                tri_to_graph([
                    points[yi][xi], 
                    points[yi][xi + 1], 
                    points[yi + 1][xi]
                ], [
                    points[yi + 1][xi], 
                    points[yi][xi + 1], 
                    points[yi + 1][xi + 1]
                ]);                    
            }        
        }
    }
}

module golden_taiwan(
            taiwan_fineness, 
            wave_fineness, model_type) {
    
    module taiwan() {
        mirror_taiwan = [for(pt = shape_taiwan(15)) [pt[0] * -1, pt[1]]];

        translate([127.5, 42.5, 83]) golden_spiral_extrude(
            mirror_taiwan, 
            from = 1,  
            to = 10, 
            point_distance = taiwan_fineness,
            scale = 10
        );    
    }

    module wave() {
        t_step = wave_fineness;
        thickness = 100;

        ctrl_pts = [
            [[0, 0, 20],  [60, 0, -35],   [90, 0, 60],    [200, 0, 5]],
            [[0, 50, 30], [100, 60, -25], [120, 50, 120], [200, 50, 5]],
            [[0, 100, 0], [60, 120, 35],  [90, 100, 60],  [200, 100, 45]],
            [[0, 123, 0], [60, 123, -35], [90, 123, 60],  [200, 123, 45]]
        ];

        g = bezier_surface(t_step, ctrl_pts);

        difference() {
            function_grapher(g, thickness);
            translate([-1, -1, -120]) cube([220, 130, 110]);
        }    
    }

    if(model_type == "Both" || model_type == "Taiwan") {
        taiwan();
    }
    if(model_type == "Both" || model_type == "Wave") {
        wave();
    }
}

golden_taiwan(
   taiwan_fineness, 
   wave_fineness, 
   model_type
);
